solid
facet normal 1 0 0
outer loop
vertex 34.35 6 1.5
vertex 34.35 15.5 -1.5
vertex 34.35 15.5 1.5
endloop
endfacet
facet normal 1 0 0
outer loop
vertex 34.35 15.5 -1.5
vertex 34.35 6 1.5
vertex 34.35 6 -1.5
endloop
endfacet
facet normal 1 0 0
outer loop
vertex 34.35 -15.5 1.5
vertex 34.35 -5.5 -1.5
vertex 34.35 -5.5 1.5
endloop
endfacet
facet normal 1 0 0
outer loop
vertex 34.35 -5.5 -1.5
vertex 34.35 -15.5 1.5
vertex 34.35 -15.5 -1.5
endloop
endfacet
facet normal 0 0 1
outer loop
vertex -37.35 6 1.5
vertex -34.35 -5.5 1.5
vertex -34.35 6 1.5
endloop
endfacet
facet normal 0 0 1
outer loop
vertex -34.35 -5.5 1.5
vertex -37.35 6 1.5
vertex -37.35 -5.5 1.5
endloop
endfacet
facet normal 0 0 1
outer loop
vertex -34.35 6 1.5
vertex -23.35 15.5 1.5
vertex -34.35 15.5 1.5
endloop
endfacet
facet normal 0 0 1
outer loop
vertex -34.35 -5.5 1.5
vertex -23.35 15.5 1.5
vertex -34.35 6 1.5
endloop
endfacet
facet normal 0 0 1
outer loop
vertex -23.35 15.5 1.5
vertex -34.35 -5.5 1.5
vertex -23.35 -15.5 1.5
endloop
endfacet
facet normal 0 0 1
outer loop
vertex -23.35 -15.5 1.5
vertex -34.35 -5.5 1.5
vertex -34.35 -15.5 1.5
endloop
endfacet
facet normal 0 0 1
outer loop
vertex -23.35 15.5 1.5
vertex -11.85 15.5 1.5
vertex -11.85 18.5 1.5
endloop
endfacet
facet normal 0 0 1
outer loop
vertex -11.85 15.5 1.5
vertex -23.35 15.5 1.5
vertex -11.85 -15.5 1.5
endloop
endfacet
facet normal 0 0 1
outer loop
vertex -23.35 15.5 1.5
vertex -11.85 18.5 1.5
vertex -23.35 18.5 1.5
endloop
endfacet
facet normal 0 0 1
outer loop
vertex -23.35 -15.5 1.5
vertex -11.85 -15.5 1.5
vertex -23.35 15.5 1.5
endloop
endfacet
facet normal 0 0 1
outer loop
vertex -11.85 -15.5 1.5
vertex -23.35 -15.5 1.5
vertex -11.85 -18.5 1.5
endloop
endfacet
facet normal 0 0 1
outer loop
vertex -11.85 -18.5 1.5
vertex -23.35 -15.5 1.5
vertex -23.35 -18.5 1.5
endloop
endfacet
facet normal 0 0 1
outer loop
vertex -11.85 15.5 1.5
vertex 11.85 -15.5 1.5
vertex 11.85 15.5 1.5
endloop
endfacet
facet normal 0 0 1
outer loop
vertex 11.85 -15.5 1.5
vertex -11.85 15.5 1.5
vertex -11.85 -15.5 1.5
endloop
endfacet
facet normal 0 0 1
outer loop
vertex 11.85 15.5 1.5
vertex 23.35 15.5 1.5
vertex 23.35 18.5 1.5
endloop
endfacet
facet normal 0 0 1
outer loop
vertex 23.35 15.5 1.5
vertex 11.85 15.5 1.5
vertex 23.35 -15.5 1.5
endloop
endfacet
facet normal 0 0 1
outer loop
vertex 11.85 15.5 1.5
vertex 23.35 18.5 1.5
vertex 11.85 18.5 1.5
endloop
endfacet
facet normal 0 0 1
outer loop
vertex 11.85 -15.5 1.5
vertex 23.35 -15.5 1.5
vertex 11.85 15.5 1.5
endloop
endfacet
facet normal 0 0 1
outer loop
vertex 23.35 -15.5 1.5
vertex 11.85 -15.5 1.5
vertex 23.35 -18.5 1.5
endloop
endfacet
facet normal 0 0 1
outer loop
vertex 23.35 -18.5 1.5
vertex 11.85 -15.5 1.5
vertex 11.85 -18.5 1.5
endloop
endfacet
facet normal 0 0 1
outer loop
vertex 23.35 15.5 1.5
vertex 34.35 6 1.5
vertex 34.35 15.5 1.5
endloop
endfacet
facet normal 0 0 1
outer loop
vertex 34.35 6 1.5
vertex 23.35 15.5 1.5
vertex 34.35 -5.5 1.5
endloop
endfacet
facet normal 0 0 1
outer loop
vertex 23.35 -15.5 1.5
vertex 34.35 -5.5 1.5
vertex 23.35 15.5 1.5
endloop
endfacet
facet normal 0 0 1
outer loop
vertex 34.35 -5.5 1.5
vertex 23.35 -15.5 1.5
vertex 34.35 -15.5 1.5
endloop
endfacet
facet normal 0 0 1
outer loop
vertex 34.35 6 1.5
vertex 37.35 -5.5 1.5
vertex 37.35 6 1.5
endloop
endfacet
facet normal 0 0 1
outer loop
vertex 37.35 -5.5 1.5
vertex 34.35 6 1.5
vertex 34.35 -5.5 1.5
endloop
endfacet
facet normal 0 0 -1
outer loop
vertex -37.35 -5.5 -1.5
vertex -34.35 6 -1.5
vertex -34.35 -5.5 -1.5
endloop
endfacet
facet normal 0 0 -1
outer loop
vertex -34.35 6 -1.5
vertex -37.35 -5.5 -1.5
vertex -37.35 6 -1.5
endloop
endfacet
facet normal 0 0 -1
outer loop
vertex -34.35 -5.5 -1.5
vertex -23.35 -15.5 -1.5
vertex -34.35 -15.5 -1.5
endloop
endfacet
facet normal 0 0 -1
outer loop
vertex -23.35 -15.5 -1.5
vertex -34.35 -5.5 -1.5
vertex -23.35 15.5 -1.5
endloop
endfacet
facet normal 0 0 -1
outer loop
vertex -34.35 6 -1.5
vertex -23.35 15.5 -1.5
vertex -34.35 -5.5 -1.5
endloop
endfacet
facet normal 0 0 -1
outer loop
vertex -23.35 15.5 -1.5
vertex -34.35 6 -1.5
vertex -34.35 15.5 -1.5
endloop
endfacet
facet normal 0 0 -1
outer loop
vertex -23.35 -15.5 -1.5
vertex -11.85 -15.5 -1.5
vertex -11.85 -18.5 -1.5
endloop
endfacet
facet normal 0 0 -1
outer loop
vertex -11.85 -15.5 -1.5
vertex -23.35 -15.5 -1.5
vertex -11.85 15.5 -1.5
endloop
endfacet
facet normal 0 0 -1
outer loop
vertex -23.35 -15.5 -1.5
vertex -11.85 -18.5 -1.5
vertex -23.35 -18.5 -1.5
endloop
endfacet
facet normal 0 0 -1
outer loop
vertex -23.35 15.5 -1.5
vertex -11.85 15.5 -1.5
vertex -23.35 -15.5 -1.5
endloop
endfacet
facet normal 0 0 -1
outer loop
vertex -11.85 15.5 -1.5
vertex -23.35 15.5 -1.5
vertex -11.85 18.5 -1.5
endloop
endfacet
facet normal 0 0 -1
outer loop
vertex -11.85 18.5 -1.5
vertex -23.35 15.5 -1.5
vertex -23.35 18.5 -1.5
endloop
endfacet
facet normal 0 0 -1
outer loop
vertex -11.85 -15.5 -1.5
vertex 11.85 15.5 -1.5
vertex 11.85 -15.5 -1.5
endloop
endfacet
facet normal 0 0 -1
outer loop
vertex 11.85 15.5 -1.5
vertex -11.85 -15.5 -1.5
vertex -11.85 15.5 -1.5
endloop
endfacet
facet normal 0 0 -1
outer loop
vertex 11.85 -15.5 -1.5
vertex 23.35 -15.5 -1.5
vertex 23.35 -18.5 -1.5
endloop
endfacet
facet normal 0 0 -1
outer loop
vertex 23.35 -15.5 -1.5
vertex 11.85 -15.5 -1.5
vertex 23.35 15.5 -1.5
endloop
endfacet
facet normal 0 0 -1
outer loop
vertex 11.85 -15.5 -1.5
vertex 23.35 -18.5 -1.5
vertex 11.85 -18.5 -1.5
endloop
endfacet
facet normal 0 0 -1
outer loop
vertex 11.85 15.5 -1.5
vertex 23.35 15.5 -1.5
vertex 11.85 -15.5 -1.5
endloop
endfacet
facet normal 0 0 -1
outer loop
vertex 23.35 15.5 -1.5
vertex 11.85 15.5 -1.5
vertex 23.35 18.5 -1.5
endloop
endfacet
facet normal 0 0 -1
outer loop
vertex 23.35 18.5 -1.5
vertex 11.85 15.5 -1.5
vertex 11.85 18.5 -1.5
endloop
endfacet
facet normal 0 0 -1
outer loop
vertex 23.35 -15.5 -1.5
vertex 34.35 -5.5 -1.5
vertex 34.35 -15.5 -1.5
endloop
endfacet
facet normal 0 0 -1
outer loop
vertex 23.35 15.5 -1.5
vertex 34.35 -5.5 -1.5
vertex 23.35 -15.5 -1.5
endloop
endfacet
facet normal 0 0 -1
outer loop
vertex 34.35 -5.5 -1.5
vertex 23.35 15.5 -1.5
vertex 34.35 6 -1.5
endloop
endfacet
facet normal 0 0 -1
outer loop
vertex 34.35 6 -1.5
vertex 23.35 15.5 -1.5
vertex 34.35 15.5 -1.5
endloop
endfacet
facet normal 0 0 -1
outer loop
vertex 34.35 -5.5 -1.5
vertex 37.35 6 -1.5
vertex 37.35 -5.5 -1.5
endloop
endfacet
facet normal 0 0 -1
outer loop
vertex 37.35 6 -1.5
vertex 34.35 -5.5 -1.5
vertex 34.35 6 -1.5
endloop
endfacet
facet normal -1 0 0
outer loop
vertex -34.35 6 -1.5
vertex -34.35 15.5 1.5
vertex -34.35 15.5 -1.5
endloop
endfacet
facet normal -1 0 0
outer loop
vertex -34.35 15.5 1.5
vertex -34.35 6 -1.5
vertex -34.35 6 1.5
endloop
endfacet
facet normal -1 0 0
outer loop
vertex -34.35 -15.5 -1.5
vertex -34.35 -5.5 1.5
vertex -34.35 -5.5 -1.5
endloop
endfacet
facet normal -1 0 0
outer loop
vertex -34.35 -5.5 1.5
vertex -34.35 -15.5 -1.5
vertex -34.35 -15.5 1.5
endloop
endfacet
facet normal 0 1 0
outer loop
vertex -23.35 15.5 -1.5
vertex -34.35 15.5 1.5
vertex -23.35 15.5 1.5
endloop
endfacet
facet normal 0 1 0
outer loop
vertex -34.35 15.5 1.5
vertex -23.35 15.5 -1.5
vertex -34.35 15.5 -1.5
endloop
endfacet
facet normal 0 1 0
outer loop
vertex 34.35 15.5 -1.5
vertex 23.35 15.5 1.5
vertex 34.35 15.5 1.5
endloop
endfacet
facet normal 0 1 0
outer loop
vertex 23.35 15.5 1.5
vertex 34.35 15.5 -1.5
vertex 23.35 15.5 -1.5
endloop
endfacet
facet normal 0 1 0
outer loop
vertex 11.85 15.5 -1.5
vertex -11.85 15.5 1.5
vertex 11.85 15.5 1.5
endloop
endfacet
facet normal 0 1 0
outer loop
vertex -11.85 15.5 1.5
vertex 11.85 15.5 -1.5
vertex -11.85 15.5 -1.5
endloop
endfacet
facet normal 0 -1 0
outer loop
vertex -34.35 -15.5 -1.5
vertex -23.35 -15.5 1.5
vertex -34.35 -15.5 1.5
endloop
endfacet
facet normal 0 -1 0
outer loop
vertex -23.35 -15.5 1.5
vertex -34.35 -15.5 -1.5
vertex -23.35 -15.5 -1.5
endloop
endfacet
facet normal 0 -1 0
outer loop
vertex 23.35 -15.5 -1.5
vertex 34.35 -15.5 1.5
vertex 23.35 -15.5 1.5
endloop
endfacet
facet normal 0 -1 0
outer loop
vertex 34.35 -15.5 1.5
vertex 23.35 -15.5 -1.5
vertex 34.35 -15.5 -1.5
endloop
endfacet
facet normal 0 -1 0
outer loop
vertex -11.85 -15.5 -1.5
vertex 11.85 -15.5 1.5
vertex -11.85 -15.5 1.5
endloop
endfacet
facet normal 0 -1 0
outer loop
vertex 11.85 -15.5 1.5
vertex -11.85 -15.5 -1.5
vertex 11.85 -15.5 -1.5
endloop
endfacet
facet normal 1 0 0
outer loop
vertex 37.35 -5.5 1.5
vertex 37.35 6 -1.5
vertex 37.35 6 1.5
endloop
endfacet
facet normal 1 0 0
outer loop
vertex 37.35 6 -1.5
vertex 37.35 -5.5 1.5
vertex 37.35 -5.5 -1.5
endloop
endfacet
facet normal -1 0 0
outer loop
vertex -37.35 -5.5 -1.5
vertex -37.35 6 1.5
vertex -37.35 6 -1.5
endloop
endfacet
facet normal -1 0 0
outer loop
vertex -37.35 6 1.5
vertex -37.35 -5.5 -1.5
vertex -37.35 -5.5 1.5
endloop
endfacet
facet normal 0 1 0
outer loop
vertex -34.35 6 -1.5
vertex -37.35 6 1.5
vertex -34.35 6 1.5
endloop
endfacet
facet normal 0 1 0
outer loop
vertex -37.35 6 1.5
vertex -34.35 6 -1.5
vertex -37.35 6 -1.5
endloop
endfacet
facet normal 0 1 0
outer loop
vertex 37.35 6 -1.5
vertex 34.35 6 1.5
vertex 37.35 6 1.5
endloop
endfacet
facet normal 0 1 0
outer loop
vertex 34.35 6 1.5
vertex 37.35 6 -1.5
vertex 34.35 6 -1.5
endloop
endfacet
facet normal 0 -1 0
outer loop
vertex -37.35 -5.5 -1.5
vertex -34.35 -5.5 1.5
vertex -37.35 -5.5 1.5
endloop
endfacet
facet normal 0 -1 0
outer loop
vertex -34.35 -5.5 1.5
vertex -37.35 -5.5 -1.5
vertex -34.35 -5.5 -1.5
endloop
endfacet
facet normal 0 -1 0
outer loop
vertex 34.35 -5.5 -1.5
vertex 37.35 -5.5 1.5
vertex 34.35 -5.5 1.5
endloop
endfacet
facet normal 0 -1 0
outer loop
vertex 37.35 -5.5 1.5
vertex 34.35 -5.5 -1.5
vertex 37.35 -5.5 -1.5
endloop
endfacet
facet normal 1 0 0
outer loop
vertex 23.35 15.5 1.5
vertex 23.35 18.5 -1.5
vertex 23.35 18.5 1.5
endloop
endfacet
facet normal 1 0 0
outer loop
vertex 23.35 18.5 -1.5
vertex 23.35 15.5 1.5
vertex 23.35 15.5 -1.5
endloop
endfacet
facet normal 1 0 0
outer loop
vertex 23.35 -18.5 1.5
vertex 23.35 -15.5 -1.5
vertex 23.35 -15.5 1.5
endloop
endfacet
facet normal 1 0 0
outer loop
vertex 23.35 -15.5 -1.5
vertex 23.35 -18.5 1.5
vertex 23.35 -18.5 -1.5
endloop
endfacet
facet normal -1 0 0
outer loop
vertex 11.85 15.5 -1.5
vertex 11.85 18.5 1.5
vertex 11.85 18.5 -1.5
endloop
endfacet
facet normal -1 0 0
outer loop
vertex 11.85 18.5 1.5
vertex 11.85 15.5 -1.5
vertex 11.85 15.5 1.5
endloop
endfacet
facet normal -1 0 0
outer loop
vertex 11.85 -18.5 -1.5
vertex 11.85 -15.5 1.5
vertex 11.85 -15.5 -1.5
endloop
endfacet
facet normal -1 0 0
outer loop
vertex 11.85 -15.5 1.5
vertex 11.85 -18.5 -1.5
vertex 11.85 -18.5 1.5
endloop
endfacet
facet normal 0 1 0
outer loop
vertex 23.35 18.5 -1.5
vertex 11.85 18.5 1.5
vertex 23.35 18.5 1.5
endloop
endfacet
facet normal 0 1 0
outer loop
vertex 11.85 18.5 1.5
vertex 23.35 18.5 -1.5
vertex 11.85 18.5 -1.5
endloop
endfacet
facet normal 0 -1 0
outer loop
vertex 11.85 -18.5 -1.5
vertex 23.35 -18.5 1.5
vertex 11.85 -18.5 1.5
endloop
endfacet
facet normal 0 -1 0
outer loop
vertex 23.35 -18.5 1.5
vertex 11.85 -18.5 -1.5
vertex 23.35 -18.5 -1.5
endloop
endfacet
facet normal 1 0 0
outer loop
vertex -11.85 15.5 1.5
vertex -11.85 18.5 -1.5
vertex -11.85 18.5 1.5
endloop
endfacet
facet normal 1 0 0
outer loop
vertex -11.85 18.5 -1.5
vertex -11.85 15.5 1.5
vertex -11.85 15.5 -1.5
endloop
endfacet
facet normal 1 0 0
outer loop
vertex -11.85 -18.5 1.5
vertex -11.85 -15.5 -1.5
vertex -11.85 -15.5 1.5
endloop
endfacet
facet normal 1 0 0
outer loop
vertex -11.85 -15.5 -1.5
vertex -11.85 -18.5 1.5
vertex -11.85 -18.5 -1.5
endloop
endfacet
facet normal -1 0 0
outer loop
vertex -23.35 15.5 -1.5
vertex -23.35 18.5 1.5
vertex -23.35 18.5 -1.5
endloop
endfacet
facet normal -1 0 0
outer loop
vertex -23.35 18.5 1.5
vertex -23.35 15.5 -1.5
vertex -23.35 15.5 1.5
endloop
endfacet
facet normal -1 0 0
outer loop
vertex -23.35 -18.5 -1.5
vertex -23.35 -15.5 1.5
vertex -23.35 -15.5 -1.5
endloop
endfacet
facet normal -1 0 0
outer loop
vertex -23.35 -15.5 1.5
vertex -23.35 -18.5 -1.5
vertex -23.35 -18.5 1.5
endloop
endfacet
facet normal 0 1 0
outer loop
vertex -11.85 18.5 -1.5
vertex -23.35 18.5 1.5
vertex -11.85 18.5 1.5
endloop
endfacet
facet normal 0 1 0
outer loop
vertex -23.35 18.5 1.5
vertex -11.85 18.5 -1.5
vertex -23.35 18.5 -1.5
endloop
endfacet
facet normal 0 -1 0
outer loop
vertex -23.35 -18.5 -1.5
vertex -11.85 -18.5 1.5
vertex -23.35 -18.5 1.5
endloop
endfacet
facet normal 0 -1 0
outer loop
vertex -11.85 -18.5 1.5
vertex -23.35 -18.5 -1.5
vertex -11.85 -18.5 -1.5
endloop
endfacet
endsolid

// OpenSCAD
len1=74.7;
wid1=37;
len2=68.7;
wid2=31;
union() {
    cube([len2,wid2,3],true);
    translate([0,0.25,0]) cube([len1,11.5,3],true);
    translate([len2/2-11.5/2-11,0,0]) cube([11.5,wid1,3],true);
    translate([-len2/2+11.5/2+11,0,0]) cube([11.5,wid1,3],true);
}
